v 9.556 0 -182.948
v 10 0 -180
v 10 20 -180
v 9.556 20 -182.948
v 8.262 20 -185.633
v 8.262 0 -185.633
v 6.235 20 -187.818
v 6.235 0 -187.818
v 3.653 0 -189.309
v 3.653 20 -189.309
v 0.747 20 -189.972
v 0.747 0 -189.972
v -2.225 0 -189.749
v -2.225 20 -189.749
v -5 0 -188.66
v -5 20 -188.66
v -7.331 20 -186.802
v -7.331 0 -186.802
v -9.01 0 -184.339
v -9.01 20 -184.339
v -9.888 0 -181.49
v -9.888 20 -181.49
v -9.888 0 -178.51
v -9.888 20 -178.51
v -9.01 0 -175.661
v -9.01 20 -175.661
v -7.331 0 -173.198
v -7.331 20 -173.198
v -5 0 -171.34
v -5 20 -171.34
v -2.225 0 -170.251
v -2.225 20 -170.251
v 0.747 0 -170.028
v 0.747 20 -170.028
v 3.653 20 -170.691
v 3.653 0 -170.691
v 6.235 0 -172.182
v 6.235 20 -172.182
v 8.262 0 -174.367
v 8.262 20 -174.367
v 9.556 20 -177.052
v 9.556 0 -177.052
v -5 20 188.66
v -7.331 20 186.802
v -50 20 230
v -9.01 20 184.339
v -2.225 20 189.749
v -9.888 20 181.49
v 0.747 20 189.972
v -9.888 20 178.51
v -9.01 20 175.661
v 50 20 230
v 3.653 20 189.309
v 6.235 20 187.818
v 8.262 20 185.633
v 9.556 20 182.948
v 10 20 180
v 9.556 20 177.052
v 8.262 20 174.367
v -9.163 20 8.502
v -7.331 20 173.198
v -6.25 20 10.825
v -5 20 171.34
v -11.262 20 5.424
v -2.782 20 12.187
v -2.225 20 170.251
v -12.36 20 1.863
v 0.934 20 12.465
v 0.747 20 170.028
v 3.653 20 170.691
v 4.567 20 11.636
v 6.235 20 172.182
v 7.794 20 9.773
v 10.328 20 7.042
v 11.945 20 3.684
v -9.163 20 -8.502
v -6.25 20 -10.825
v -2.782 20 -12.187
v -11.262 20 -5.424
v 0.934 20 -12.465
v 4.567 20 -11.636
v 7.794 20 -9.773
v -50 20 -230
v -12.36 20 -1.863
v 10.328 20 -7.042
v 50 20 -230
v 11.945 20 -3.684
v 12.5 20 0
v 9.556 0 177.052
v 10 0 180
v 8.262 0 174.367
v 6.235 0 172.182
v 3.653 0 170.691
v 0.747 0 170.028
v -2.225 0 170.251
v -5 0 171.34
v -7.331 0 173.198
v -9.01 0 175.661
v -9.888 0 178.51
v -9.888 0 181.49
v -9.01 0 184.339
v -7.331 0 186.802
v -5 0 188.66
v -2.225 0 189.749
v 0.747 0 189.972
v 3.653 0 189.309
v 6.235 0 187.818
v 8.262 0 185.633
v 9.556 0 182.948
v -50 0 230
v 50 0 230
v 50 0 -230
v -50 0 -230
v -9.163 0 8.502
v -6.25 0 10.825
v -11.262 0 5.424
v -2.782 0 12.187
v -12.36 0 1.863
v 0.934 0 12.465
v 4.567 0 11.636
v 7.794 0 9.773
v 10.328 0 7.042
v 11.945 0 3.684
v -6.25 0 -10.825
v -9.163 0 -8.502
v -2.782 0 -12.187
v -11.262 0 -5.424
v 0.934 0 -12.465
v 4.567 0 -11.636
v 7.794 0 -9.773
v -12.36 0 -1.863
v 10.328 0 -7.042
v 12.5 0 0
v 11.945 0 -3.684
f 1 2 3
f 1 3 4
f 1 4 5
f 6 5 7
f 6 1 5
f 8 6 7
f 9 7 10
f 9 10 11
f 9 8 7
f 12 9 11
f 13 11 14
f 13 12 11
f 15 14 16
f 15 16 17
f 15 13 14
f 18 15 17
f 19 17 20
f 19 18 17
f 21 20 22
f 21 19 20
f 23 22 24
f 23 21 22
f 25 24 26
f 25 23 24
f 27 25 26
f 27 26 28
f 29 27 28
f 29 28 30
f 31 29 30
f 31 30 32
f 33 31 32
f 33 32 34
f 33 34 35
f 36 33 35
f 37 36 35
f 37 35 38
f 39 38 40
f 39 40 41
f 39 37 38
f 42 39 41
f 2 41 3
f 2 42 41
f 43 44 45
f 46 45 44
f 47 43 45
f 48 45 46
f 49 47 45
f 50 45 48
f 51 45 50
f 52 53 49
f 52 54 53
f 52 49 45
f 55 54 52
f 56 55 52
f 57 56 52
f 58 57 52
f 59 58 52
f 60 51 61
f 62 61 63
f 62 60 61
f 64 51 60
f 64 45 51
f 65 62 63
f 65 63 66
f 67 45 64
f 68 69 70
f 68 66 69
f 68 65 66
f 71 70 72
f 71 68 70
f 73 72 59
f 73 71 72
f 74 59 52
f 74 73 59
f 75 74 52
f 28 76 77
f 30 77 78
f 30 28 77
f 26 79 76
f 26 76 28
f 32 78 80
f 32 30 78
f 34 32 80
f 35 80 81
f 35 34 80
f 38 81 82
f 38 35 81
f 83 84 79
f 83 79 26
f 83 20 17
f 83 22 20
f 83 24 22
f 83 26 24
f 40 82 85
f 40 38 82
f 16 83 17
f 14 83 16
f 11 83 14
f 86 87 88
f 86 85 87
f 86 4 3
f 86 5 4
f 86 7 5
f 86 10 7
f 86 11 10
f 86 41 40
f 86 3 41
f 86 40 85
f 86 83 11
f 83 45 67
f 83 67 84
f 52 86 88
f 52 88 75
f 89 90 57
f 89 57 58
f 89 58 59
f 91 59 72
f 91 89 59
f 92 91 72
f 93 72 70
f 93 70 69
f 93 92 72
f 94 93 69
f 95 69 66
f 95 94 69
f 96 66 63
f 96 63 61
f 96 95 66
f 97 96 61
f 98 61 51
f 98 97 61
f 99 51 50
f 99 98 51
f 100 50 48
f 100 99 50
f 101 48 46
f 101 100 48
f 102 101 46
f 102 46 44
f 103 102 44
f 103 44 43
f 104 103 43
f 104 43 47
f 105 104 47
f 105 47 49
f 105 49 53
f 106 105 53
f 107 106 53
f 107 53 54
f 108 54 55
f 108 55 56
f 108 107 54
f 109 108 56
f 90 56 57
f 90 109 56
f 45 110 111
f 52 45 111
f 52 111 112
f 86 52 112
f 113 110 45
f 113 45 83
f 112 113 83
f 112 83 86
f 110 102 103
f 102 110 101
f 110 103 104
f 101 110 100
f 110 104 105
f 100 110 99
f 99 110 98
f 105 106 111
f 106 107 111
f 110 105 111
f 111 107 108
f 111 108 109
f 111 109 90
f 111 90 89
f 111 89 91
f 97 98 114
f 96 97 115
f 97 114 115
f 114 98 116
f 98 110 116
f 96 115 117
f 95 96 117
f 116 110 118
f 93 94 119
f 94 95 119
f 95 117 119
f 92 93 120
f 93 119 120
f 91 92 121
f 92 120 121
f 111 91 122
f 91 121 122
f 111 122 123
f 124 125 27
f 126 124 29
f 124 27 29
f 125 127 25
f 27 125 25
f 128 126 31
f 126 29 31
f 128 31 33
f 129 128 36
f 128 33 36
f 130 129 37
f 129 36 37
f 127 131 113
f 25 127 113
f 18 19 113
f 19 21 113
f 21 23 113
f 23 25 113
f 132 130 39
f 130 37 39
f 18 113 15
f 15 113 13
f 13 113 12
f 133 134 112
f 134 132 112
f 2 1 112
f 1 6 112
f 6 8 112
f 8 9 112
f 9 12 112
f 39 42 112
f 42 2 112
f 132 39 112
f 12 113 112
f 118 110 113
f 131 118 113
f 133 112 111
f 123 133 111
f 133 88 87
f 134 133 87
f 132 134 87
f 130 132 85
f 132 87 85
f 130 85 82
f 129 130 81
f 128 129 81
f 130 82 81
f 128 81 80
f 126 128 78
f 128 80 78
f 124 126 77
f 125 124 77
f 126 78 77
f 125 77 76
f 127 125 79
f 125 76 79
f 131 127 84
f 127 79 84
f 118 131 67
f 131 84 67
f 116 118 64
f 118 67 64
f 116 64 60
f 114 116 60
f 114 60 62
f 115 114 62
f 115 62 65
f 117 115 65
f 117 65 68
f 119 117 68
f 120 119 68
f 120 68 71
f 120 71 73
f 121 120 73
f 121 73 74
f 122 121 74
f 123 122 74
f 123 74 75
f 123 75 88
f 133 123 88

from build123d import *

# Parameters (mm, degrees)
SKETCH1_W           = 100
SKETCH1_H           = 460
SKETCH1_R           = 10
BOSS_EXTRUDE1_DEPTH = 20
SKETCH2_R           = 12.5
CUT_EXTRUDE1_DEPTH  = 21


with BuildPart() as part:
    # Sketch1 → Boss-Extrude1 (new body)
    with BuildSketch(Plane(origin=(0, 0, 0), x_dir=(1, 0, 0), z_dir=(0, 1, 0))):
        Rectangle(SKETCH1_W, SKETCH1_H)
        with Locations((0, -180)):
            Circle(SKETCH1_R, mode=Mode.SUBTRACT)
        with Locations((0, 180)):
            Circle(SKETCH1_R, mode=Mode.SUBTRACT)
    extrude(amount=BOSS_EXTRUDE1_DEPTH)

    # Sketch2 → Cut-Extrude1 (cut, through all)
    with BuildSketch(Plane(origin=(0, 20, 0), x_dir=(1, 0, 0), z_dir=(0, 1, 0))):
        Circle(SKETCH2_R)
    extrude(amount=-CUT_EXTRUDE1_DEPTH, mode=Mode.SUBTRACT)


solid = part.part
